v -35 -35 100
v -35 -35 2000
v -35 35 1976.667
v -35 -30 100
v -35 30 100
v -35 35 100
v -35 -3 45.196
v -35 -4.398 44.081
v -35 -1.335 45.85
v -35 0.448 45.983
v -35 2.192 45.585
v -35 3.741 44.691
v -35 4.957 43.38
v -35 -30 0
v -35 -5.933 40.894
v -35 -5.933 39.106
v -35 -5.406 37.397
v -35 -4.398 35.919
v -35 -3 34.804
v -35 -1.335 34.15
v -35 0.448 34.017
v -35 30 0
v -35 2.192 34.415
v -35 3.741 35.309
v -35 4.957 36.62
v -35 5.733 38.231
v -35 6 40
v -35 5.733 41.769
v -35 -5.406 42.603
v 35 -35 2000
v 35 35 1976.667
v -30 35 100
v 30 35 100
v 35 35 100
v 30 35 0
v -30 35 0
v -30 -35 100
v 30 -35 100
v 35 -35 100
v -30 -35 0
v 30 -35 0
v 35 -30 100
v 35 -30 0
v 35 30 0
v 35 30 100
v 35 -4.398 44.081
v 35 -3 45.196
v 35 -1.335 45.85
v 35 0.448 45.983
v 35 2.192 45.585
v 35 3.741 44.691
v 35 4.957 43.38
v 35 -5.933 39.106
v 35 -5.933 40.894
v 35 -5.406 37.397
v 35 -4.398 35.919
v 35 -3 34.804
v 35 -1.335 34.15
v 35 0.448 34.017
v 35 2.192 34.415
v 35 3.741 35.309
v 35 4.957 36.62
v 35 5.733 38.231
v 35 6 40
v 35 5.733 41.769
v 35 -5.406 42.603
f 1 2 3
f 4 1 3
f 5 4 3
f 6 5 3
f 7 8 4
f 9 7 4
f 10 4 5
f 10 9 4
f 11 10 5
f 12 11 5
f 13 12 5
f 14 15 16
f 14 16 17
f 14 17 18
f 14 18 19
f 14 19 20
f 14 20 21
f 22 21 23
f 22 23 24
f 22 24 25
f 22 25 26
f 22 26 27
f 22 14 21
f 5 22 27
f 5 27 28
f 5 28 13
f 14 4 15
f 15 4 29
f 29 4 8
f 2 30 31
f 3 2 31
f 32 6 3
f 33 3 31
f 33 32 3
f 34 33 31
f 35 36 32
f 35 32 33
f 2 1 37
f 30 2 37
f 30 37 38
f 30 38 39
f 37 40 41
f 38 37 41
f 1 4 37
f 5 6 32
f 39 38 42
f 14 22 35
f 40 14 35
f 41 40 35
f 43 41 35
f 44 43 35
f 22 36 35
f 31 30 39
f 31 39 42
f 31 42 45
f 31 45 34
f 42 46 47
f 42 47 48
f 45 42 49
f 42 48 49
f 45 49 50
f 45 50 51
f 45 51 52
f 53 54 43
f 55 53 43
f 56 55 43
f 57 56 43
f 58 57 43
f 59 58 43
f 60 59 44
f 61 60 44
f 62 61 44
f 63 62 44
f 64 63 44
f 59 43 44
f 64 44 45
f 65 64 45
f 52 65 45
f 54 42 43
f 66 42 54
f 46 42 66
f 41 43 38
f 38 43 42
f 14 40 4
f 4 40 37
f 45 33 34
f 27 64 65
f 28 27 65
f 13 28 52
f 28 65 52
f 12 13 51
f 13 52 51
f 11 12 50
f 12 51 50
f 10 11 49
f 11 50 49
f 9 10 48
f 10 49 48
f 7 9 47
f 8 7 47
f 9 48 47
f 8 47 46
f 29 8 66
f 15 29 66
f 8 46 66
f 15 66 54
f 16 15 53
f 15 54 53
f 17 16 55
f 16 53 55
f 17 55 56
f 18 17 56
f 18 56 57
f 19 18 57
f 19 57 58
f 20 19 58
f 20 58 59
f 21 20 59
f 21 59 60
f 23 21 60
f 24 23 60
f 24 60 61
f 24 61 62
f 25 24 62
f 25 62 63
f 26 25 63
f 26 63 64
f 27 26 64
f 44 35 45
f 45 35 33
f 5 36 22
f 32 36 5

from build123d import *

# Parameters (mm, degrees)
F0_W     = 70
F0_H     = 70
F1_DEPTH = 100
F2_SIZE  = 5
F3_W     = 70
F3_H     = 70
F4_DEPTH = 1900
F5_R     = 6
F6_DEPTH = 70.001


with BuildPart() as f1:
    # F0 (on Top) → F1 (new body)
    with BuildSketch(Plane.XY):
        Rectangle(F0_W, F0_H)
    extrude(amount=F1_DEPTH)

    # F2
    f2_edges = [f1.edges().sort_by_distance(p)[0] for p in [
        (-35, -35, 50),
        (35, -35, 50),
        (35, 35, 50),
        (-35, 35, 50),
    ]]
    chamfer(f2_edges, length=F2_SIZE)

    # F3 (on face) → F4 (join)
    with BuildSketch(Plane.XY.offset(100)):
        Rectangle(F3_W, F3_H)
    extrude(amount=F4_DEPTH)

    # F5 (on face) → F6 (cut, through all)
    with BuildSketch(Plane.YZ.offset(35)):
        with Locations((0, 40)):
            Circle(F5_R)
        Polygon((35, 2000), (-35, 2000), (35, 1976.666667), align=None)
    extrude(amount=-F6_DEPTH, mode=Mode.SUBTRACT)


solid = f1.part
